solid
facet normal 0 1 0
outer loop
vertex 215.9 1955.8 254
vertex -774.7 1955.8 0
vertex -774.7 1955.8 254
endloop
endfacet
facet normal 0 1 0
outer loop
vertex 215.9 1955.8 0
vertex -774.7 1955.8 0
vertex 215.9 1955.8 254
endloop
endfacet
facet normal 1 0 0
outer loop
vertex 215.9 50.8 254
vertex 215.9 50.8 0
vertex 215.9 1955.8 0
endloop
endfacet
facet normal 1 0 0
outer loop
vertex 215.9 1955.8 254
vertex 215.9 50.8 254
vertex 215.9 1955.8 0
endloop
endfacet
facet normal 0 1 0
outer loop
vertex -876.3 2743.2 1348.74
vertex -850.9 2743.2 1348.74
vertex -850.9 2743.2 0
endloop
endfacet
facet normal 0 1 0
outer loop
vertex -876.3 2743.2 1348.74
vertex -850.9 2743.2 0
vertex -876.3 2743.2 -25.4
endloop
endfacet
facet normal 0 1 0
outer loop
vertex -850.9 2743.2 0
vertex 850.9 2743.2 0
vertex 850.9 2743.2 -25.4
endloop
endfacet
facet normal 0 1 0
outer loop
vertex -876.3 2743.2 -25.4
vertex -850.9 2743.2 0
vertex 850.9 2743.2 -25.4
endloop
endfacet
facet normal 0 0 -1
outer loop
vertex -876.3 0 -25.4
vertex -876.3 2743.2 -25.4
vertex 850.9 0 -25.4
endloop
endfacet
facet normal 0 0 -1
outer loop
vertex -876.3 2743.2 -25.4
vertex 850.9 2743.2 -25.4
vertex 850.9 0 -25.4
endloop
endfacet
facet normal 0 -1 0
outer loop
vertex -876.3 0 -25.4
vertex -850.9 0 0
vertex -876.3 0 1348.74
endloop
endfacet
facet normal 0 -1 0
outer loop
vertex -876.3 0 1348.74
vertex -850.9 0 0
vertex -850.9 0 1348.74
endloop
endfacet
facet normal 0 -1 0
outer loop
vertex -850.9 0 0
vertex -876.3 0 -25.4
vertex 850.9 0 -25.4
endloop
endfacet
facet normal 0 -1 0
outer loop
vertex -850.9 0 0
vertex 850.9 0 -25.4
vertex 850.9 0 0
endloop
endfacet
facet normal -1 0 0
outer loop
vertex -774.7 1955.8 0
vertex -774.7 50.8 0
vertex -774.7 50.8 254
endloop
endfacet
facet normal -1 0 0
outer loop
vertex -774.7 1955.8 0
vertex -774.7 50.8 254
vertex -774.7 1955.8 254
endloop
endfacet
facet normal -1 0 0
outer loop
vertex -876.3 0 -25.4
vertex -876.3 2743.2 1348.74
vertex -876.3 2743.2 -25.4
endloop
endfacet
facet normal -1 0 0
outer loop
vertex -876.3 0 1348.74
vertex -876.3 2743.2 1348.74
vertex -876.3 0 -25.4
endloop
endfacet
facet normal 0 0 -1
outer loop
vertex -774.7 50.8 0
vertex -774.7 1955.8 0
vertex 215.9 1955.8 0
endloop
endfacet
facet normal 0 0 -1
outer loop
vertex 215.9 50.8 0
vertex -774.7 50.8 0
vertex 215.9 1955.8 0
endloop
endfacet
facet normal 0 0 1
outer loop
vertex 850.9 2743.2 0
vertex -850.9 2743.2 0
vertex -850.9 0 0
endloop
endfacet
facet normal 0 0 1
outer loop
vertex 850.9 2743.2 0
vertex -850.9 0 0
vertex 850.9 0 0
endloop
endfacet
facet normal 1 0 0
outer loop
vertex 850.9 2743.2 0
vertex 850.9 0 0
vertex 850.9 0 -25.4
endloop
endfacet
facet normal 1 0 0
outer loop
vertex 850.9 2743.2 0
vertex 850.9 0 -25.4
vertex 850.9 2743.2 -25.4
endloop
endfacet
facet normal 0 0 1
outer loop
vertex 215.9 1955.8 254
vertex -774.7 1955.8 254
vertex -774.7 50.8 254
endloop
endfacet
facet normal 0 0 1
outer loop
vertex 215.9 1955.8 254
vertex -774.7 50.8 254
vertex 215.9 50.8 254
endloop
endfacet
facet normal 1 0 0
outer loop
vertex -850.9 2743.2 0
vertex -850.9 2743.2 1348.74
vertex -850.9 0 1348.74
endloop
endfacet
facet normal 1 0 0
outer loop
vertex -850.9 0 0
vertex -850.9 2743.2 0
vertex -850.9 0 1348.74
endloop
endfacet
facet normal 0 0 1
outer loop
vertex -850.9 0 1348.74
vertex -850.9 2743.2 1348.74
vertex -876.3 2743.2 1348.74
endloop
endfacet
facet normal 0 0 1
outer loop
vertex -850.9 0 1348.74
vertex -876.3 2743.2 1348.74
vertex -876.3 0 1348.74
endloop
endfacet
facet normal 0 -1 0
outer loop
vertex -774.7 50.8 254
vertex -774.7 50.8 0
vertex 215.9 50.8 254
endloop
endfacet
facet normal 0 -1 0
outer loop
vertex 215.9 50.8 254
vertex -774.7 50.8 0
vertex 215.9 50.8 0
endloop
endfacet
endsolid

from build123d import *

# Parameters (mm, degrees)
F1_DEPTH = 25.4
F2_W     = 2743.2
F2_H     = 1348.74
F2_H_2   = 25.4
F3_DEPTH = 25.4
F4_W     = 990.6
F4_H     = 1905
F5_DEPTH = 254


with BuildPart() as f1:
    # F0 (on Top) → F1 (new body)
    with BuildSketch(Plane.XY):
        Polygon((-850.9, 2743.2), (-850.9, 0), (0, 0), (850.9, 0), (850.9, 2743.2), (0, 2743.2), align=None)
    extrude(amount=-F1_DEPTH)

    # F2 (on face) → F3 (join)
    with BuildSketch(Plane(origin=(-850.9, 0, 0), x_dir=(0, -1, 0), z_dir=(-1, 0, 0))):
        with Locations((-1371.6, 674.37)):
            Rectangle(F2_W, F2_H)
        with Locations((-1371.6, -12.7)):
            Rectangle(F2_W, F2_H_2)
    extrude(amount=F3_DEPTH)


with BuildPart() as f5:
    # F4 (on face) → F5 (new body)
    with BuildSketch(Plane.XY):
        with Locations((-279.4, 1003.3)):
            Rectangle(F4_W, F4_H)
    extrude(amount=F5_DEPTH)


solid = Compound([f1.part, f5.part])
